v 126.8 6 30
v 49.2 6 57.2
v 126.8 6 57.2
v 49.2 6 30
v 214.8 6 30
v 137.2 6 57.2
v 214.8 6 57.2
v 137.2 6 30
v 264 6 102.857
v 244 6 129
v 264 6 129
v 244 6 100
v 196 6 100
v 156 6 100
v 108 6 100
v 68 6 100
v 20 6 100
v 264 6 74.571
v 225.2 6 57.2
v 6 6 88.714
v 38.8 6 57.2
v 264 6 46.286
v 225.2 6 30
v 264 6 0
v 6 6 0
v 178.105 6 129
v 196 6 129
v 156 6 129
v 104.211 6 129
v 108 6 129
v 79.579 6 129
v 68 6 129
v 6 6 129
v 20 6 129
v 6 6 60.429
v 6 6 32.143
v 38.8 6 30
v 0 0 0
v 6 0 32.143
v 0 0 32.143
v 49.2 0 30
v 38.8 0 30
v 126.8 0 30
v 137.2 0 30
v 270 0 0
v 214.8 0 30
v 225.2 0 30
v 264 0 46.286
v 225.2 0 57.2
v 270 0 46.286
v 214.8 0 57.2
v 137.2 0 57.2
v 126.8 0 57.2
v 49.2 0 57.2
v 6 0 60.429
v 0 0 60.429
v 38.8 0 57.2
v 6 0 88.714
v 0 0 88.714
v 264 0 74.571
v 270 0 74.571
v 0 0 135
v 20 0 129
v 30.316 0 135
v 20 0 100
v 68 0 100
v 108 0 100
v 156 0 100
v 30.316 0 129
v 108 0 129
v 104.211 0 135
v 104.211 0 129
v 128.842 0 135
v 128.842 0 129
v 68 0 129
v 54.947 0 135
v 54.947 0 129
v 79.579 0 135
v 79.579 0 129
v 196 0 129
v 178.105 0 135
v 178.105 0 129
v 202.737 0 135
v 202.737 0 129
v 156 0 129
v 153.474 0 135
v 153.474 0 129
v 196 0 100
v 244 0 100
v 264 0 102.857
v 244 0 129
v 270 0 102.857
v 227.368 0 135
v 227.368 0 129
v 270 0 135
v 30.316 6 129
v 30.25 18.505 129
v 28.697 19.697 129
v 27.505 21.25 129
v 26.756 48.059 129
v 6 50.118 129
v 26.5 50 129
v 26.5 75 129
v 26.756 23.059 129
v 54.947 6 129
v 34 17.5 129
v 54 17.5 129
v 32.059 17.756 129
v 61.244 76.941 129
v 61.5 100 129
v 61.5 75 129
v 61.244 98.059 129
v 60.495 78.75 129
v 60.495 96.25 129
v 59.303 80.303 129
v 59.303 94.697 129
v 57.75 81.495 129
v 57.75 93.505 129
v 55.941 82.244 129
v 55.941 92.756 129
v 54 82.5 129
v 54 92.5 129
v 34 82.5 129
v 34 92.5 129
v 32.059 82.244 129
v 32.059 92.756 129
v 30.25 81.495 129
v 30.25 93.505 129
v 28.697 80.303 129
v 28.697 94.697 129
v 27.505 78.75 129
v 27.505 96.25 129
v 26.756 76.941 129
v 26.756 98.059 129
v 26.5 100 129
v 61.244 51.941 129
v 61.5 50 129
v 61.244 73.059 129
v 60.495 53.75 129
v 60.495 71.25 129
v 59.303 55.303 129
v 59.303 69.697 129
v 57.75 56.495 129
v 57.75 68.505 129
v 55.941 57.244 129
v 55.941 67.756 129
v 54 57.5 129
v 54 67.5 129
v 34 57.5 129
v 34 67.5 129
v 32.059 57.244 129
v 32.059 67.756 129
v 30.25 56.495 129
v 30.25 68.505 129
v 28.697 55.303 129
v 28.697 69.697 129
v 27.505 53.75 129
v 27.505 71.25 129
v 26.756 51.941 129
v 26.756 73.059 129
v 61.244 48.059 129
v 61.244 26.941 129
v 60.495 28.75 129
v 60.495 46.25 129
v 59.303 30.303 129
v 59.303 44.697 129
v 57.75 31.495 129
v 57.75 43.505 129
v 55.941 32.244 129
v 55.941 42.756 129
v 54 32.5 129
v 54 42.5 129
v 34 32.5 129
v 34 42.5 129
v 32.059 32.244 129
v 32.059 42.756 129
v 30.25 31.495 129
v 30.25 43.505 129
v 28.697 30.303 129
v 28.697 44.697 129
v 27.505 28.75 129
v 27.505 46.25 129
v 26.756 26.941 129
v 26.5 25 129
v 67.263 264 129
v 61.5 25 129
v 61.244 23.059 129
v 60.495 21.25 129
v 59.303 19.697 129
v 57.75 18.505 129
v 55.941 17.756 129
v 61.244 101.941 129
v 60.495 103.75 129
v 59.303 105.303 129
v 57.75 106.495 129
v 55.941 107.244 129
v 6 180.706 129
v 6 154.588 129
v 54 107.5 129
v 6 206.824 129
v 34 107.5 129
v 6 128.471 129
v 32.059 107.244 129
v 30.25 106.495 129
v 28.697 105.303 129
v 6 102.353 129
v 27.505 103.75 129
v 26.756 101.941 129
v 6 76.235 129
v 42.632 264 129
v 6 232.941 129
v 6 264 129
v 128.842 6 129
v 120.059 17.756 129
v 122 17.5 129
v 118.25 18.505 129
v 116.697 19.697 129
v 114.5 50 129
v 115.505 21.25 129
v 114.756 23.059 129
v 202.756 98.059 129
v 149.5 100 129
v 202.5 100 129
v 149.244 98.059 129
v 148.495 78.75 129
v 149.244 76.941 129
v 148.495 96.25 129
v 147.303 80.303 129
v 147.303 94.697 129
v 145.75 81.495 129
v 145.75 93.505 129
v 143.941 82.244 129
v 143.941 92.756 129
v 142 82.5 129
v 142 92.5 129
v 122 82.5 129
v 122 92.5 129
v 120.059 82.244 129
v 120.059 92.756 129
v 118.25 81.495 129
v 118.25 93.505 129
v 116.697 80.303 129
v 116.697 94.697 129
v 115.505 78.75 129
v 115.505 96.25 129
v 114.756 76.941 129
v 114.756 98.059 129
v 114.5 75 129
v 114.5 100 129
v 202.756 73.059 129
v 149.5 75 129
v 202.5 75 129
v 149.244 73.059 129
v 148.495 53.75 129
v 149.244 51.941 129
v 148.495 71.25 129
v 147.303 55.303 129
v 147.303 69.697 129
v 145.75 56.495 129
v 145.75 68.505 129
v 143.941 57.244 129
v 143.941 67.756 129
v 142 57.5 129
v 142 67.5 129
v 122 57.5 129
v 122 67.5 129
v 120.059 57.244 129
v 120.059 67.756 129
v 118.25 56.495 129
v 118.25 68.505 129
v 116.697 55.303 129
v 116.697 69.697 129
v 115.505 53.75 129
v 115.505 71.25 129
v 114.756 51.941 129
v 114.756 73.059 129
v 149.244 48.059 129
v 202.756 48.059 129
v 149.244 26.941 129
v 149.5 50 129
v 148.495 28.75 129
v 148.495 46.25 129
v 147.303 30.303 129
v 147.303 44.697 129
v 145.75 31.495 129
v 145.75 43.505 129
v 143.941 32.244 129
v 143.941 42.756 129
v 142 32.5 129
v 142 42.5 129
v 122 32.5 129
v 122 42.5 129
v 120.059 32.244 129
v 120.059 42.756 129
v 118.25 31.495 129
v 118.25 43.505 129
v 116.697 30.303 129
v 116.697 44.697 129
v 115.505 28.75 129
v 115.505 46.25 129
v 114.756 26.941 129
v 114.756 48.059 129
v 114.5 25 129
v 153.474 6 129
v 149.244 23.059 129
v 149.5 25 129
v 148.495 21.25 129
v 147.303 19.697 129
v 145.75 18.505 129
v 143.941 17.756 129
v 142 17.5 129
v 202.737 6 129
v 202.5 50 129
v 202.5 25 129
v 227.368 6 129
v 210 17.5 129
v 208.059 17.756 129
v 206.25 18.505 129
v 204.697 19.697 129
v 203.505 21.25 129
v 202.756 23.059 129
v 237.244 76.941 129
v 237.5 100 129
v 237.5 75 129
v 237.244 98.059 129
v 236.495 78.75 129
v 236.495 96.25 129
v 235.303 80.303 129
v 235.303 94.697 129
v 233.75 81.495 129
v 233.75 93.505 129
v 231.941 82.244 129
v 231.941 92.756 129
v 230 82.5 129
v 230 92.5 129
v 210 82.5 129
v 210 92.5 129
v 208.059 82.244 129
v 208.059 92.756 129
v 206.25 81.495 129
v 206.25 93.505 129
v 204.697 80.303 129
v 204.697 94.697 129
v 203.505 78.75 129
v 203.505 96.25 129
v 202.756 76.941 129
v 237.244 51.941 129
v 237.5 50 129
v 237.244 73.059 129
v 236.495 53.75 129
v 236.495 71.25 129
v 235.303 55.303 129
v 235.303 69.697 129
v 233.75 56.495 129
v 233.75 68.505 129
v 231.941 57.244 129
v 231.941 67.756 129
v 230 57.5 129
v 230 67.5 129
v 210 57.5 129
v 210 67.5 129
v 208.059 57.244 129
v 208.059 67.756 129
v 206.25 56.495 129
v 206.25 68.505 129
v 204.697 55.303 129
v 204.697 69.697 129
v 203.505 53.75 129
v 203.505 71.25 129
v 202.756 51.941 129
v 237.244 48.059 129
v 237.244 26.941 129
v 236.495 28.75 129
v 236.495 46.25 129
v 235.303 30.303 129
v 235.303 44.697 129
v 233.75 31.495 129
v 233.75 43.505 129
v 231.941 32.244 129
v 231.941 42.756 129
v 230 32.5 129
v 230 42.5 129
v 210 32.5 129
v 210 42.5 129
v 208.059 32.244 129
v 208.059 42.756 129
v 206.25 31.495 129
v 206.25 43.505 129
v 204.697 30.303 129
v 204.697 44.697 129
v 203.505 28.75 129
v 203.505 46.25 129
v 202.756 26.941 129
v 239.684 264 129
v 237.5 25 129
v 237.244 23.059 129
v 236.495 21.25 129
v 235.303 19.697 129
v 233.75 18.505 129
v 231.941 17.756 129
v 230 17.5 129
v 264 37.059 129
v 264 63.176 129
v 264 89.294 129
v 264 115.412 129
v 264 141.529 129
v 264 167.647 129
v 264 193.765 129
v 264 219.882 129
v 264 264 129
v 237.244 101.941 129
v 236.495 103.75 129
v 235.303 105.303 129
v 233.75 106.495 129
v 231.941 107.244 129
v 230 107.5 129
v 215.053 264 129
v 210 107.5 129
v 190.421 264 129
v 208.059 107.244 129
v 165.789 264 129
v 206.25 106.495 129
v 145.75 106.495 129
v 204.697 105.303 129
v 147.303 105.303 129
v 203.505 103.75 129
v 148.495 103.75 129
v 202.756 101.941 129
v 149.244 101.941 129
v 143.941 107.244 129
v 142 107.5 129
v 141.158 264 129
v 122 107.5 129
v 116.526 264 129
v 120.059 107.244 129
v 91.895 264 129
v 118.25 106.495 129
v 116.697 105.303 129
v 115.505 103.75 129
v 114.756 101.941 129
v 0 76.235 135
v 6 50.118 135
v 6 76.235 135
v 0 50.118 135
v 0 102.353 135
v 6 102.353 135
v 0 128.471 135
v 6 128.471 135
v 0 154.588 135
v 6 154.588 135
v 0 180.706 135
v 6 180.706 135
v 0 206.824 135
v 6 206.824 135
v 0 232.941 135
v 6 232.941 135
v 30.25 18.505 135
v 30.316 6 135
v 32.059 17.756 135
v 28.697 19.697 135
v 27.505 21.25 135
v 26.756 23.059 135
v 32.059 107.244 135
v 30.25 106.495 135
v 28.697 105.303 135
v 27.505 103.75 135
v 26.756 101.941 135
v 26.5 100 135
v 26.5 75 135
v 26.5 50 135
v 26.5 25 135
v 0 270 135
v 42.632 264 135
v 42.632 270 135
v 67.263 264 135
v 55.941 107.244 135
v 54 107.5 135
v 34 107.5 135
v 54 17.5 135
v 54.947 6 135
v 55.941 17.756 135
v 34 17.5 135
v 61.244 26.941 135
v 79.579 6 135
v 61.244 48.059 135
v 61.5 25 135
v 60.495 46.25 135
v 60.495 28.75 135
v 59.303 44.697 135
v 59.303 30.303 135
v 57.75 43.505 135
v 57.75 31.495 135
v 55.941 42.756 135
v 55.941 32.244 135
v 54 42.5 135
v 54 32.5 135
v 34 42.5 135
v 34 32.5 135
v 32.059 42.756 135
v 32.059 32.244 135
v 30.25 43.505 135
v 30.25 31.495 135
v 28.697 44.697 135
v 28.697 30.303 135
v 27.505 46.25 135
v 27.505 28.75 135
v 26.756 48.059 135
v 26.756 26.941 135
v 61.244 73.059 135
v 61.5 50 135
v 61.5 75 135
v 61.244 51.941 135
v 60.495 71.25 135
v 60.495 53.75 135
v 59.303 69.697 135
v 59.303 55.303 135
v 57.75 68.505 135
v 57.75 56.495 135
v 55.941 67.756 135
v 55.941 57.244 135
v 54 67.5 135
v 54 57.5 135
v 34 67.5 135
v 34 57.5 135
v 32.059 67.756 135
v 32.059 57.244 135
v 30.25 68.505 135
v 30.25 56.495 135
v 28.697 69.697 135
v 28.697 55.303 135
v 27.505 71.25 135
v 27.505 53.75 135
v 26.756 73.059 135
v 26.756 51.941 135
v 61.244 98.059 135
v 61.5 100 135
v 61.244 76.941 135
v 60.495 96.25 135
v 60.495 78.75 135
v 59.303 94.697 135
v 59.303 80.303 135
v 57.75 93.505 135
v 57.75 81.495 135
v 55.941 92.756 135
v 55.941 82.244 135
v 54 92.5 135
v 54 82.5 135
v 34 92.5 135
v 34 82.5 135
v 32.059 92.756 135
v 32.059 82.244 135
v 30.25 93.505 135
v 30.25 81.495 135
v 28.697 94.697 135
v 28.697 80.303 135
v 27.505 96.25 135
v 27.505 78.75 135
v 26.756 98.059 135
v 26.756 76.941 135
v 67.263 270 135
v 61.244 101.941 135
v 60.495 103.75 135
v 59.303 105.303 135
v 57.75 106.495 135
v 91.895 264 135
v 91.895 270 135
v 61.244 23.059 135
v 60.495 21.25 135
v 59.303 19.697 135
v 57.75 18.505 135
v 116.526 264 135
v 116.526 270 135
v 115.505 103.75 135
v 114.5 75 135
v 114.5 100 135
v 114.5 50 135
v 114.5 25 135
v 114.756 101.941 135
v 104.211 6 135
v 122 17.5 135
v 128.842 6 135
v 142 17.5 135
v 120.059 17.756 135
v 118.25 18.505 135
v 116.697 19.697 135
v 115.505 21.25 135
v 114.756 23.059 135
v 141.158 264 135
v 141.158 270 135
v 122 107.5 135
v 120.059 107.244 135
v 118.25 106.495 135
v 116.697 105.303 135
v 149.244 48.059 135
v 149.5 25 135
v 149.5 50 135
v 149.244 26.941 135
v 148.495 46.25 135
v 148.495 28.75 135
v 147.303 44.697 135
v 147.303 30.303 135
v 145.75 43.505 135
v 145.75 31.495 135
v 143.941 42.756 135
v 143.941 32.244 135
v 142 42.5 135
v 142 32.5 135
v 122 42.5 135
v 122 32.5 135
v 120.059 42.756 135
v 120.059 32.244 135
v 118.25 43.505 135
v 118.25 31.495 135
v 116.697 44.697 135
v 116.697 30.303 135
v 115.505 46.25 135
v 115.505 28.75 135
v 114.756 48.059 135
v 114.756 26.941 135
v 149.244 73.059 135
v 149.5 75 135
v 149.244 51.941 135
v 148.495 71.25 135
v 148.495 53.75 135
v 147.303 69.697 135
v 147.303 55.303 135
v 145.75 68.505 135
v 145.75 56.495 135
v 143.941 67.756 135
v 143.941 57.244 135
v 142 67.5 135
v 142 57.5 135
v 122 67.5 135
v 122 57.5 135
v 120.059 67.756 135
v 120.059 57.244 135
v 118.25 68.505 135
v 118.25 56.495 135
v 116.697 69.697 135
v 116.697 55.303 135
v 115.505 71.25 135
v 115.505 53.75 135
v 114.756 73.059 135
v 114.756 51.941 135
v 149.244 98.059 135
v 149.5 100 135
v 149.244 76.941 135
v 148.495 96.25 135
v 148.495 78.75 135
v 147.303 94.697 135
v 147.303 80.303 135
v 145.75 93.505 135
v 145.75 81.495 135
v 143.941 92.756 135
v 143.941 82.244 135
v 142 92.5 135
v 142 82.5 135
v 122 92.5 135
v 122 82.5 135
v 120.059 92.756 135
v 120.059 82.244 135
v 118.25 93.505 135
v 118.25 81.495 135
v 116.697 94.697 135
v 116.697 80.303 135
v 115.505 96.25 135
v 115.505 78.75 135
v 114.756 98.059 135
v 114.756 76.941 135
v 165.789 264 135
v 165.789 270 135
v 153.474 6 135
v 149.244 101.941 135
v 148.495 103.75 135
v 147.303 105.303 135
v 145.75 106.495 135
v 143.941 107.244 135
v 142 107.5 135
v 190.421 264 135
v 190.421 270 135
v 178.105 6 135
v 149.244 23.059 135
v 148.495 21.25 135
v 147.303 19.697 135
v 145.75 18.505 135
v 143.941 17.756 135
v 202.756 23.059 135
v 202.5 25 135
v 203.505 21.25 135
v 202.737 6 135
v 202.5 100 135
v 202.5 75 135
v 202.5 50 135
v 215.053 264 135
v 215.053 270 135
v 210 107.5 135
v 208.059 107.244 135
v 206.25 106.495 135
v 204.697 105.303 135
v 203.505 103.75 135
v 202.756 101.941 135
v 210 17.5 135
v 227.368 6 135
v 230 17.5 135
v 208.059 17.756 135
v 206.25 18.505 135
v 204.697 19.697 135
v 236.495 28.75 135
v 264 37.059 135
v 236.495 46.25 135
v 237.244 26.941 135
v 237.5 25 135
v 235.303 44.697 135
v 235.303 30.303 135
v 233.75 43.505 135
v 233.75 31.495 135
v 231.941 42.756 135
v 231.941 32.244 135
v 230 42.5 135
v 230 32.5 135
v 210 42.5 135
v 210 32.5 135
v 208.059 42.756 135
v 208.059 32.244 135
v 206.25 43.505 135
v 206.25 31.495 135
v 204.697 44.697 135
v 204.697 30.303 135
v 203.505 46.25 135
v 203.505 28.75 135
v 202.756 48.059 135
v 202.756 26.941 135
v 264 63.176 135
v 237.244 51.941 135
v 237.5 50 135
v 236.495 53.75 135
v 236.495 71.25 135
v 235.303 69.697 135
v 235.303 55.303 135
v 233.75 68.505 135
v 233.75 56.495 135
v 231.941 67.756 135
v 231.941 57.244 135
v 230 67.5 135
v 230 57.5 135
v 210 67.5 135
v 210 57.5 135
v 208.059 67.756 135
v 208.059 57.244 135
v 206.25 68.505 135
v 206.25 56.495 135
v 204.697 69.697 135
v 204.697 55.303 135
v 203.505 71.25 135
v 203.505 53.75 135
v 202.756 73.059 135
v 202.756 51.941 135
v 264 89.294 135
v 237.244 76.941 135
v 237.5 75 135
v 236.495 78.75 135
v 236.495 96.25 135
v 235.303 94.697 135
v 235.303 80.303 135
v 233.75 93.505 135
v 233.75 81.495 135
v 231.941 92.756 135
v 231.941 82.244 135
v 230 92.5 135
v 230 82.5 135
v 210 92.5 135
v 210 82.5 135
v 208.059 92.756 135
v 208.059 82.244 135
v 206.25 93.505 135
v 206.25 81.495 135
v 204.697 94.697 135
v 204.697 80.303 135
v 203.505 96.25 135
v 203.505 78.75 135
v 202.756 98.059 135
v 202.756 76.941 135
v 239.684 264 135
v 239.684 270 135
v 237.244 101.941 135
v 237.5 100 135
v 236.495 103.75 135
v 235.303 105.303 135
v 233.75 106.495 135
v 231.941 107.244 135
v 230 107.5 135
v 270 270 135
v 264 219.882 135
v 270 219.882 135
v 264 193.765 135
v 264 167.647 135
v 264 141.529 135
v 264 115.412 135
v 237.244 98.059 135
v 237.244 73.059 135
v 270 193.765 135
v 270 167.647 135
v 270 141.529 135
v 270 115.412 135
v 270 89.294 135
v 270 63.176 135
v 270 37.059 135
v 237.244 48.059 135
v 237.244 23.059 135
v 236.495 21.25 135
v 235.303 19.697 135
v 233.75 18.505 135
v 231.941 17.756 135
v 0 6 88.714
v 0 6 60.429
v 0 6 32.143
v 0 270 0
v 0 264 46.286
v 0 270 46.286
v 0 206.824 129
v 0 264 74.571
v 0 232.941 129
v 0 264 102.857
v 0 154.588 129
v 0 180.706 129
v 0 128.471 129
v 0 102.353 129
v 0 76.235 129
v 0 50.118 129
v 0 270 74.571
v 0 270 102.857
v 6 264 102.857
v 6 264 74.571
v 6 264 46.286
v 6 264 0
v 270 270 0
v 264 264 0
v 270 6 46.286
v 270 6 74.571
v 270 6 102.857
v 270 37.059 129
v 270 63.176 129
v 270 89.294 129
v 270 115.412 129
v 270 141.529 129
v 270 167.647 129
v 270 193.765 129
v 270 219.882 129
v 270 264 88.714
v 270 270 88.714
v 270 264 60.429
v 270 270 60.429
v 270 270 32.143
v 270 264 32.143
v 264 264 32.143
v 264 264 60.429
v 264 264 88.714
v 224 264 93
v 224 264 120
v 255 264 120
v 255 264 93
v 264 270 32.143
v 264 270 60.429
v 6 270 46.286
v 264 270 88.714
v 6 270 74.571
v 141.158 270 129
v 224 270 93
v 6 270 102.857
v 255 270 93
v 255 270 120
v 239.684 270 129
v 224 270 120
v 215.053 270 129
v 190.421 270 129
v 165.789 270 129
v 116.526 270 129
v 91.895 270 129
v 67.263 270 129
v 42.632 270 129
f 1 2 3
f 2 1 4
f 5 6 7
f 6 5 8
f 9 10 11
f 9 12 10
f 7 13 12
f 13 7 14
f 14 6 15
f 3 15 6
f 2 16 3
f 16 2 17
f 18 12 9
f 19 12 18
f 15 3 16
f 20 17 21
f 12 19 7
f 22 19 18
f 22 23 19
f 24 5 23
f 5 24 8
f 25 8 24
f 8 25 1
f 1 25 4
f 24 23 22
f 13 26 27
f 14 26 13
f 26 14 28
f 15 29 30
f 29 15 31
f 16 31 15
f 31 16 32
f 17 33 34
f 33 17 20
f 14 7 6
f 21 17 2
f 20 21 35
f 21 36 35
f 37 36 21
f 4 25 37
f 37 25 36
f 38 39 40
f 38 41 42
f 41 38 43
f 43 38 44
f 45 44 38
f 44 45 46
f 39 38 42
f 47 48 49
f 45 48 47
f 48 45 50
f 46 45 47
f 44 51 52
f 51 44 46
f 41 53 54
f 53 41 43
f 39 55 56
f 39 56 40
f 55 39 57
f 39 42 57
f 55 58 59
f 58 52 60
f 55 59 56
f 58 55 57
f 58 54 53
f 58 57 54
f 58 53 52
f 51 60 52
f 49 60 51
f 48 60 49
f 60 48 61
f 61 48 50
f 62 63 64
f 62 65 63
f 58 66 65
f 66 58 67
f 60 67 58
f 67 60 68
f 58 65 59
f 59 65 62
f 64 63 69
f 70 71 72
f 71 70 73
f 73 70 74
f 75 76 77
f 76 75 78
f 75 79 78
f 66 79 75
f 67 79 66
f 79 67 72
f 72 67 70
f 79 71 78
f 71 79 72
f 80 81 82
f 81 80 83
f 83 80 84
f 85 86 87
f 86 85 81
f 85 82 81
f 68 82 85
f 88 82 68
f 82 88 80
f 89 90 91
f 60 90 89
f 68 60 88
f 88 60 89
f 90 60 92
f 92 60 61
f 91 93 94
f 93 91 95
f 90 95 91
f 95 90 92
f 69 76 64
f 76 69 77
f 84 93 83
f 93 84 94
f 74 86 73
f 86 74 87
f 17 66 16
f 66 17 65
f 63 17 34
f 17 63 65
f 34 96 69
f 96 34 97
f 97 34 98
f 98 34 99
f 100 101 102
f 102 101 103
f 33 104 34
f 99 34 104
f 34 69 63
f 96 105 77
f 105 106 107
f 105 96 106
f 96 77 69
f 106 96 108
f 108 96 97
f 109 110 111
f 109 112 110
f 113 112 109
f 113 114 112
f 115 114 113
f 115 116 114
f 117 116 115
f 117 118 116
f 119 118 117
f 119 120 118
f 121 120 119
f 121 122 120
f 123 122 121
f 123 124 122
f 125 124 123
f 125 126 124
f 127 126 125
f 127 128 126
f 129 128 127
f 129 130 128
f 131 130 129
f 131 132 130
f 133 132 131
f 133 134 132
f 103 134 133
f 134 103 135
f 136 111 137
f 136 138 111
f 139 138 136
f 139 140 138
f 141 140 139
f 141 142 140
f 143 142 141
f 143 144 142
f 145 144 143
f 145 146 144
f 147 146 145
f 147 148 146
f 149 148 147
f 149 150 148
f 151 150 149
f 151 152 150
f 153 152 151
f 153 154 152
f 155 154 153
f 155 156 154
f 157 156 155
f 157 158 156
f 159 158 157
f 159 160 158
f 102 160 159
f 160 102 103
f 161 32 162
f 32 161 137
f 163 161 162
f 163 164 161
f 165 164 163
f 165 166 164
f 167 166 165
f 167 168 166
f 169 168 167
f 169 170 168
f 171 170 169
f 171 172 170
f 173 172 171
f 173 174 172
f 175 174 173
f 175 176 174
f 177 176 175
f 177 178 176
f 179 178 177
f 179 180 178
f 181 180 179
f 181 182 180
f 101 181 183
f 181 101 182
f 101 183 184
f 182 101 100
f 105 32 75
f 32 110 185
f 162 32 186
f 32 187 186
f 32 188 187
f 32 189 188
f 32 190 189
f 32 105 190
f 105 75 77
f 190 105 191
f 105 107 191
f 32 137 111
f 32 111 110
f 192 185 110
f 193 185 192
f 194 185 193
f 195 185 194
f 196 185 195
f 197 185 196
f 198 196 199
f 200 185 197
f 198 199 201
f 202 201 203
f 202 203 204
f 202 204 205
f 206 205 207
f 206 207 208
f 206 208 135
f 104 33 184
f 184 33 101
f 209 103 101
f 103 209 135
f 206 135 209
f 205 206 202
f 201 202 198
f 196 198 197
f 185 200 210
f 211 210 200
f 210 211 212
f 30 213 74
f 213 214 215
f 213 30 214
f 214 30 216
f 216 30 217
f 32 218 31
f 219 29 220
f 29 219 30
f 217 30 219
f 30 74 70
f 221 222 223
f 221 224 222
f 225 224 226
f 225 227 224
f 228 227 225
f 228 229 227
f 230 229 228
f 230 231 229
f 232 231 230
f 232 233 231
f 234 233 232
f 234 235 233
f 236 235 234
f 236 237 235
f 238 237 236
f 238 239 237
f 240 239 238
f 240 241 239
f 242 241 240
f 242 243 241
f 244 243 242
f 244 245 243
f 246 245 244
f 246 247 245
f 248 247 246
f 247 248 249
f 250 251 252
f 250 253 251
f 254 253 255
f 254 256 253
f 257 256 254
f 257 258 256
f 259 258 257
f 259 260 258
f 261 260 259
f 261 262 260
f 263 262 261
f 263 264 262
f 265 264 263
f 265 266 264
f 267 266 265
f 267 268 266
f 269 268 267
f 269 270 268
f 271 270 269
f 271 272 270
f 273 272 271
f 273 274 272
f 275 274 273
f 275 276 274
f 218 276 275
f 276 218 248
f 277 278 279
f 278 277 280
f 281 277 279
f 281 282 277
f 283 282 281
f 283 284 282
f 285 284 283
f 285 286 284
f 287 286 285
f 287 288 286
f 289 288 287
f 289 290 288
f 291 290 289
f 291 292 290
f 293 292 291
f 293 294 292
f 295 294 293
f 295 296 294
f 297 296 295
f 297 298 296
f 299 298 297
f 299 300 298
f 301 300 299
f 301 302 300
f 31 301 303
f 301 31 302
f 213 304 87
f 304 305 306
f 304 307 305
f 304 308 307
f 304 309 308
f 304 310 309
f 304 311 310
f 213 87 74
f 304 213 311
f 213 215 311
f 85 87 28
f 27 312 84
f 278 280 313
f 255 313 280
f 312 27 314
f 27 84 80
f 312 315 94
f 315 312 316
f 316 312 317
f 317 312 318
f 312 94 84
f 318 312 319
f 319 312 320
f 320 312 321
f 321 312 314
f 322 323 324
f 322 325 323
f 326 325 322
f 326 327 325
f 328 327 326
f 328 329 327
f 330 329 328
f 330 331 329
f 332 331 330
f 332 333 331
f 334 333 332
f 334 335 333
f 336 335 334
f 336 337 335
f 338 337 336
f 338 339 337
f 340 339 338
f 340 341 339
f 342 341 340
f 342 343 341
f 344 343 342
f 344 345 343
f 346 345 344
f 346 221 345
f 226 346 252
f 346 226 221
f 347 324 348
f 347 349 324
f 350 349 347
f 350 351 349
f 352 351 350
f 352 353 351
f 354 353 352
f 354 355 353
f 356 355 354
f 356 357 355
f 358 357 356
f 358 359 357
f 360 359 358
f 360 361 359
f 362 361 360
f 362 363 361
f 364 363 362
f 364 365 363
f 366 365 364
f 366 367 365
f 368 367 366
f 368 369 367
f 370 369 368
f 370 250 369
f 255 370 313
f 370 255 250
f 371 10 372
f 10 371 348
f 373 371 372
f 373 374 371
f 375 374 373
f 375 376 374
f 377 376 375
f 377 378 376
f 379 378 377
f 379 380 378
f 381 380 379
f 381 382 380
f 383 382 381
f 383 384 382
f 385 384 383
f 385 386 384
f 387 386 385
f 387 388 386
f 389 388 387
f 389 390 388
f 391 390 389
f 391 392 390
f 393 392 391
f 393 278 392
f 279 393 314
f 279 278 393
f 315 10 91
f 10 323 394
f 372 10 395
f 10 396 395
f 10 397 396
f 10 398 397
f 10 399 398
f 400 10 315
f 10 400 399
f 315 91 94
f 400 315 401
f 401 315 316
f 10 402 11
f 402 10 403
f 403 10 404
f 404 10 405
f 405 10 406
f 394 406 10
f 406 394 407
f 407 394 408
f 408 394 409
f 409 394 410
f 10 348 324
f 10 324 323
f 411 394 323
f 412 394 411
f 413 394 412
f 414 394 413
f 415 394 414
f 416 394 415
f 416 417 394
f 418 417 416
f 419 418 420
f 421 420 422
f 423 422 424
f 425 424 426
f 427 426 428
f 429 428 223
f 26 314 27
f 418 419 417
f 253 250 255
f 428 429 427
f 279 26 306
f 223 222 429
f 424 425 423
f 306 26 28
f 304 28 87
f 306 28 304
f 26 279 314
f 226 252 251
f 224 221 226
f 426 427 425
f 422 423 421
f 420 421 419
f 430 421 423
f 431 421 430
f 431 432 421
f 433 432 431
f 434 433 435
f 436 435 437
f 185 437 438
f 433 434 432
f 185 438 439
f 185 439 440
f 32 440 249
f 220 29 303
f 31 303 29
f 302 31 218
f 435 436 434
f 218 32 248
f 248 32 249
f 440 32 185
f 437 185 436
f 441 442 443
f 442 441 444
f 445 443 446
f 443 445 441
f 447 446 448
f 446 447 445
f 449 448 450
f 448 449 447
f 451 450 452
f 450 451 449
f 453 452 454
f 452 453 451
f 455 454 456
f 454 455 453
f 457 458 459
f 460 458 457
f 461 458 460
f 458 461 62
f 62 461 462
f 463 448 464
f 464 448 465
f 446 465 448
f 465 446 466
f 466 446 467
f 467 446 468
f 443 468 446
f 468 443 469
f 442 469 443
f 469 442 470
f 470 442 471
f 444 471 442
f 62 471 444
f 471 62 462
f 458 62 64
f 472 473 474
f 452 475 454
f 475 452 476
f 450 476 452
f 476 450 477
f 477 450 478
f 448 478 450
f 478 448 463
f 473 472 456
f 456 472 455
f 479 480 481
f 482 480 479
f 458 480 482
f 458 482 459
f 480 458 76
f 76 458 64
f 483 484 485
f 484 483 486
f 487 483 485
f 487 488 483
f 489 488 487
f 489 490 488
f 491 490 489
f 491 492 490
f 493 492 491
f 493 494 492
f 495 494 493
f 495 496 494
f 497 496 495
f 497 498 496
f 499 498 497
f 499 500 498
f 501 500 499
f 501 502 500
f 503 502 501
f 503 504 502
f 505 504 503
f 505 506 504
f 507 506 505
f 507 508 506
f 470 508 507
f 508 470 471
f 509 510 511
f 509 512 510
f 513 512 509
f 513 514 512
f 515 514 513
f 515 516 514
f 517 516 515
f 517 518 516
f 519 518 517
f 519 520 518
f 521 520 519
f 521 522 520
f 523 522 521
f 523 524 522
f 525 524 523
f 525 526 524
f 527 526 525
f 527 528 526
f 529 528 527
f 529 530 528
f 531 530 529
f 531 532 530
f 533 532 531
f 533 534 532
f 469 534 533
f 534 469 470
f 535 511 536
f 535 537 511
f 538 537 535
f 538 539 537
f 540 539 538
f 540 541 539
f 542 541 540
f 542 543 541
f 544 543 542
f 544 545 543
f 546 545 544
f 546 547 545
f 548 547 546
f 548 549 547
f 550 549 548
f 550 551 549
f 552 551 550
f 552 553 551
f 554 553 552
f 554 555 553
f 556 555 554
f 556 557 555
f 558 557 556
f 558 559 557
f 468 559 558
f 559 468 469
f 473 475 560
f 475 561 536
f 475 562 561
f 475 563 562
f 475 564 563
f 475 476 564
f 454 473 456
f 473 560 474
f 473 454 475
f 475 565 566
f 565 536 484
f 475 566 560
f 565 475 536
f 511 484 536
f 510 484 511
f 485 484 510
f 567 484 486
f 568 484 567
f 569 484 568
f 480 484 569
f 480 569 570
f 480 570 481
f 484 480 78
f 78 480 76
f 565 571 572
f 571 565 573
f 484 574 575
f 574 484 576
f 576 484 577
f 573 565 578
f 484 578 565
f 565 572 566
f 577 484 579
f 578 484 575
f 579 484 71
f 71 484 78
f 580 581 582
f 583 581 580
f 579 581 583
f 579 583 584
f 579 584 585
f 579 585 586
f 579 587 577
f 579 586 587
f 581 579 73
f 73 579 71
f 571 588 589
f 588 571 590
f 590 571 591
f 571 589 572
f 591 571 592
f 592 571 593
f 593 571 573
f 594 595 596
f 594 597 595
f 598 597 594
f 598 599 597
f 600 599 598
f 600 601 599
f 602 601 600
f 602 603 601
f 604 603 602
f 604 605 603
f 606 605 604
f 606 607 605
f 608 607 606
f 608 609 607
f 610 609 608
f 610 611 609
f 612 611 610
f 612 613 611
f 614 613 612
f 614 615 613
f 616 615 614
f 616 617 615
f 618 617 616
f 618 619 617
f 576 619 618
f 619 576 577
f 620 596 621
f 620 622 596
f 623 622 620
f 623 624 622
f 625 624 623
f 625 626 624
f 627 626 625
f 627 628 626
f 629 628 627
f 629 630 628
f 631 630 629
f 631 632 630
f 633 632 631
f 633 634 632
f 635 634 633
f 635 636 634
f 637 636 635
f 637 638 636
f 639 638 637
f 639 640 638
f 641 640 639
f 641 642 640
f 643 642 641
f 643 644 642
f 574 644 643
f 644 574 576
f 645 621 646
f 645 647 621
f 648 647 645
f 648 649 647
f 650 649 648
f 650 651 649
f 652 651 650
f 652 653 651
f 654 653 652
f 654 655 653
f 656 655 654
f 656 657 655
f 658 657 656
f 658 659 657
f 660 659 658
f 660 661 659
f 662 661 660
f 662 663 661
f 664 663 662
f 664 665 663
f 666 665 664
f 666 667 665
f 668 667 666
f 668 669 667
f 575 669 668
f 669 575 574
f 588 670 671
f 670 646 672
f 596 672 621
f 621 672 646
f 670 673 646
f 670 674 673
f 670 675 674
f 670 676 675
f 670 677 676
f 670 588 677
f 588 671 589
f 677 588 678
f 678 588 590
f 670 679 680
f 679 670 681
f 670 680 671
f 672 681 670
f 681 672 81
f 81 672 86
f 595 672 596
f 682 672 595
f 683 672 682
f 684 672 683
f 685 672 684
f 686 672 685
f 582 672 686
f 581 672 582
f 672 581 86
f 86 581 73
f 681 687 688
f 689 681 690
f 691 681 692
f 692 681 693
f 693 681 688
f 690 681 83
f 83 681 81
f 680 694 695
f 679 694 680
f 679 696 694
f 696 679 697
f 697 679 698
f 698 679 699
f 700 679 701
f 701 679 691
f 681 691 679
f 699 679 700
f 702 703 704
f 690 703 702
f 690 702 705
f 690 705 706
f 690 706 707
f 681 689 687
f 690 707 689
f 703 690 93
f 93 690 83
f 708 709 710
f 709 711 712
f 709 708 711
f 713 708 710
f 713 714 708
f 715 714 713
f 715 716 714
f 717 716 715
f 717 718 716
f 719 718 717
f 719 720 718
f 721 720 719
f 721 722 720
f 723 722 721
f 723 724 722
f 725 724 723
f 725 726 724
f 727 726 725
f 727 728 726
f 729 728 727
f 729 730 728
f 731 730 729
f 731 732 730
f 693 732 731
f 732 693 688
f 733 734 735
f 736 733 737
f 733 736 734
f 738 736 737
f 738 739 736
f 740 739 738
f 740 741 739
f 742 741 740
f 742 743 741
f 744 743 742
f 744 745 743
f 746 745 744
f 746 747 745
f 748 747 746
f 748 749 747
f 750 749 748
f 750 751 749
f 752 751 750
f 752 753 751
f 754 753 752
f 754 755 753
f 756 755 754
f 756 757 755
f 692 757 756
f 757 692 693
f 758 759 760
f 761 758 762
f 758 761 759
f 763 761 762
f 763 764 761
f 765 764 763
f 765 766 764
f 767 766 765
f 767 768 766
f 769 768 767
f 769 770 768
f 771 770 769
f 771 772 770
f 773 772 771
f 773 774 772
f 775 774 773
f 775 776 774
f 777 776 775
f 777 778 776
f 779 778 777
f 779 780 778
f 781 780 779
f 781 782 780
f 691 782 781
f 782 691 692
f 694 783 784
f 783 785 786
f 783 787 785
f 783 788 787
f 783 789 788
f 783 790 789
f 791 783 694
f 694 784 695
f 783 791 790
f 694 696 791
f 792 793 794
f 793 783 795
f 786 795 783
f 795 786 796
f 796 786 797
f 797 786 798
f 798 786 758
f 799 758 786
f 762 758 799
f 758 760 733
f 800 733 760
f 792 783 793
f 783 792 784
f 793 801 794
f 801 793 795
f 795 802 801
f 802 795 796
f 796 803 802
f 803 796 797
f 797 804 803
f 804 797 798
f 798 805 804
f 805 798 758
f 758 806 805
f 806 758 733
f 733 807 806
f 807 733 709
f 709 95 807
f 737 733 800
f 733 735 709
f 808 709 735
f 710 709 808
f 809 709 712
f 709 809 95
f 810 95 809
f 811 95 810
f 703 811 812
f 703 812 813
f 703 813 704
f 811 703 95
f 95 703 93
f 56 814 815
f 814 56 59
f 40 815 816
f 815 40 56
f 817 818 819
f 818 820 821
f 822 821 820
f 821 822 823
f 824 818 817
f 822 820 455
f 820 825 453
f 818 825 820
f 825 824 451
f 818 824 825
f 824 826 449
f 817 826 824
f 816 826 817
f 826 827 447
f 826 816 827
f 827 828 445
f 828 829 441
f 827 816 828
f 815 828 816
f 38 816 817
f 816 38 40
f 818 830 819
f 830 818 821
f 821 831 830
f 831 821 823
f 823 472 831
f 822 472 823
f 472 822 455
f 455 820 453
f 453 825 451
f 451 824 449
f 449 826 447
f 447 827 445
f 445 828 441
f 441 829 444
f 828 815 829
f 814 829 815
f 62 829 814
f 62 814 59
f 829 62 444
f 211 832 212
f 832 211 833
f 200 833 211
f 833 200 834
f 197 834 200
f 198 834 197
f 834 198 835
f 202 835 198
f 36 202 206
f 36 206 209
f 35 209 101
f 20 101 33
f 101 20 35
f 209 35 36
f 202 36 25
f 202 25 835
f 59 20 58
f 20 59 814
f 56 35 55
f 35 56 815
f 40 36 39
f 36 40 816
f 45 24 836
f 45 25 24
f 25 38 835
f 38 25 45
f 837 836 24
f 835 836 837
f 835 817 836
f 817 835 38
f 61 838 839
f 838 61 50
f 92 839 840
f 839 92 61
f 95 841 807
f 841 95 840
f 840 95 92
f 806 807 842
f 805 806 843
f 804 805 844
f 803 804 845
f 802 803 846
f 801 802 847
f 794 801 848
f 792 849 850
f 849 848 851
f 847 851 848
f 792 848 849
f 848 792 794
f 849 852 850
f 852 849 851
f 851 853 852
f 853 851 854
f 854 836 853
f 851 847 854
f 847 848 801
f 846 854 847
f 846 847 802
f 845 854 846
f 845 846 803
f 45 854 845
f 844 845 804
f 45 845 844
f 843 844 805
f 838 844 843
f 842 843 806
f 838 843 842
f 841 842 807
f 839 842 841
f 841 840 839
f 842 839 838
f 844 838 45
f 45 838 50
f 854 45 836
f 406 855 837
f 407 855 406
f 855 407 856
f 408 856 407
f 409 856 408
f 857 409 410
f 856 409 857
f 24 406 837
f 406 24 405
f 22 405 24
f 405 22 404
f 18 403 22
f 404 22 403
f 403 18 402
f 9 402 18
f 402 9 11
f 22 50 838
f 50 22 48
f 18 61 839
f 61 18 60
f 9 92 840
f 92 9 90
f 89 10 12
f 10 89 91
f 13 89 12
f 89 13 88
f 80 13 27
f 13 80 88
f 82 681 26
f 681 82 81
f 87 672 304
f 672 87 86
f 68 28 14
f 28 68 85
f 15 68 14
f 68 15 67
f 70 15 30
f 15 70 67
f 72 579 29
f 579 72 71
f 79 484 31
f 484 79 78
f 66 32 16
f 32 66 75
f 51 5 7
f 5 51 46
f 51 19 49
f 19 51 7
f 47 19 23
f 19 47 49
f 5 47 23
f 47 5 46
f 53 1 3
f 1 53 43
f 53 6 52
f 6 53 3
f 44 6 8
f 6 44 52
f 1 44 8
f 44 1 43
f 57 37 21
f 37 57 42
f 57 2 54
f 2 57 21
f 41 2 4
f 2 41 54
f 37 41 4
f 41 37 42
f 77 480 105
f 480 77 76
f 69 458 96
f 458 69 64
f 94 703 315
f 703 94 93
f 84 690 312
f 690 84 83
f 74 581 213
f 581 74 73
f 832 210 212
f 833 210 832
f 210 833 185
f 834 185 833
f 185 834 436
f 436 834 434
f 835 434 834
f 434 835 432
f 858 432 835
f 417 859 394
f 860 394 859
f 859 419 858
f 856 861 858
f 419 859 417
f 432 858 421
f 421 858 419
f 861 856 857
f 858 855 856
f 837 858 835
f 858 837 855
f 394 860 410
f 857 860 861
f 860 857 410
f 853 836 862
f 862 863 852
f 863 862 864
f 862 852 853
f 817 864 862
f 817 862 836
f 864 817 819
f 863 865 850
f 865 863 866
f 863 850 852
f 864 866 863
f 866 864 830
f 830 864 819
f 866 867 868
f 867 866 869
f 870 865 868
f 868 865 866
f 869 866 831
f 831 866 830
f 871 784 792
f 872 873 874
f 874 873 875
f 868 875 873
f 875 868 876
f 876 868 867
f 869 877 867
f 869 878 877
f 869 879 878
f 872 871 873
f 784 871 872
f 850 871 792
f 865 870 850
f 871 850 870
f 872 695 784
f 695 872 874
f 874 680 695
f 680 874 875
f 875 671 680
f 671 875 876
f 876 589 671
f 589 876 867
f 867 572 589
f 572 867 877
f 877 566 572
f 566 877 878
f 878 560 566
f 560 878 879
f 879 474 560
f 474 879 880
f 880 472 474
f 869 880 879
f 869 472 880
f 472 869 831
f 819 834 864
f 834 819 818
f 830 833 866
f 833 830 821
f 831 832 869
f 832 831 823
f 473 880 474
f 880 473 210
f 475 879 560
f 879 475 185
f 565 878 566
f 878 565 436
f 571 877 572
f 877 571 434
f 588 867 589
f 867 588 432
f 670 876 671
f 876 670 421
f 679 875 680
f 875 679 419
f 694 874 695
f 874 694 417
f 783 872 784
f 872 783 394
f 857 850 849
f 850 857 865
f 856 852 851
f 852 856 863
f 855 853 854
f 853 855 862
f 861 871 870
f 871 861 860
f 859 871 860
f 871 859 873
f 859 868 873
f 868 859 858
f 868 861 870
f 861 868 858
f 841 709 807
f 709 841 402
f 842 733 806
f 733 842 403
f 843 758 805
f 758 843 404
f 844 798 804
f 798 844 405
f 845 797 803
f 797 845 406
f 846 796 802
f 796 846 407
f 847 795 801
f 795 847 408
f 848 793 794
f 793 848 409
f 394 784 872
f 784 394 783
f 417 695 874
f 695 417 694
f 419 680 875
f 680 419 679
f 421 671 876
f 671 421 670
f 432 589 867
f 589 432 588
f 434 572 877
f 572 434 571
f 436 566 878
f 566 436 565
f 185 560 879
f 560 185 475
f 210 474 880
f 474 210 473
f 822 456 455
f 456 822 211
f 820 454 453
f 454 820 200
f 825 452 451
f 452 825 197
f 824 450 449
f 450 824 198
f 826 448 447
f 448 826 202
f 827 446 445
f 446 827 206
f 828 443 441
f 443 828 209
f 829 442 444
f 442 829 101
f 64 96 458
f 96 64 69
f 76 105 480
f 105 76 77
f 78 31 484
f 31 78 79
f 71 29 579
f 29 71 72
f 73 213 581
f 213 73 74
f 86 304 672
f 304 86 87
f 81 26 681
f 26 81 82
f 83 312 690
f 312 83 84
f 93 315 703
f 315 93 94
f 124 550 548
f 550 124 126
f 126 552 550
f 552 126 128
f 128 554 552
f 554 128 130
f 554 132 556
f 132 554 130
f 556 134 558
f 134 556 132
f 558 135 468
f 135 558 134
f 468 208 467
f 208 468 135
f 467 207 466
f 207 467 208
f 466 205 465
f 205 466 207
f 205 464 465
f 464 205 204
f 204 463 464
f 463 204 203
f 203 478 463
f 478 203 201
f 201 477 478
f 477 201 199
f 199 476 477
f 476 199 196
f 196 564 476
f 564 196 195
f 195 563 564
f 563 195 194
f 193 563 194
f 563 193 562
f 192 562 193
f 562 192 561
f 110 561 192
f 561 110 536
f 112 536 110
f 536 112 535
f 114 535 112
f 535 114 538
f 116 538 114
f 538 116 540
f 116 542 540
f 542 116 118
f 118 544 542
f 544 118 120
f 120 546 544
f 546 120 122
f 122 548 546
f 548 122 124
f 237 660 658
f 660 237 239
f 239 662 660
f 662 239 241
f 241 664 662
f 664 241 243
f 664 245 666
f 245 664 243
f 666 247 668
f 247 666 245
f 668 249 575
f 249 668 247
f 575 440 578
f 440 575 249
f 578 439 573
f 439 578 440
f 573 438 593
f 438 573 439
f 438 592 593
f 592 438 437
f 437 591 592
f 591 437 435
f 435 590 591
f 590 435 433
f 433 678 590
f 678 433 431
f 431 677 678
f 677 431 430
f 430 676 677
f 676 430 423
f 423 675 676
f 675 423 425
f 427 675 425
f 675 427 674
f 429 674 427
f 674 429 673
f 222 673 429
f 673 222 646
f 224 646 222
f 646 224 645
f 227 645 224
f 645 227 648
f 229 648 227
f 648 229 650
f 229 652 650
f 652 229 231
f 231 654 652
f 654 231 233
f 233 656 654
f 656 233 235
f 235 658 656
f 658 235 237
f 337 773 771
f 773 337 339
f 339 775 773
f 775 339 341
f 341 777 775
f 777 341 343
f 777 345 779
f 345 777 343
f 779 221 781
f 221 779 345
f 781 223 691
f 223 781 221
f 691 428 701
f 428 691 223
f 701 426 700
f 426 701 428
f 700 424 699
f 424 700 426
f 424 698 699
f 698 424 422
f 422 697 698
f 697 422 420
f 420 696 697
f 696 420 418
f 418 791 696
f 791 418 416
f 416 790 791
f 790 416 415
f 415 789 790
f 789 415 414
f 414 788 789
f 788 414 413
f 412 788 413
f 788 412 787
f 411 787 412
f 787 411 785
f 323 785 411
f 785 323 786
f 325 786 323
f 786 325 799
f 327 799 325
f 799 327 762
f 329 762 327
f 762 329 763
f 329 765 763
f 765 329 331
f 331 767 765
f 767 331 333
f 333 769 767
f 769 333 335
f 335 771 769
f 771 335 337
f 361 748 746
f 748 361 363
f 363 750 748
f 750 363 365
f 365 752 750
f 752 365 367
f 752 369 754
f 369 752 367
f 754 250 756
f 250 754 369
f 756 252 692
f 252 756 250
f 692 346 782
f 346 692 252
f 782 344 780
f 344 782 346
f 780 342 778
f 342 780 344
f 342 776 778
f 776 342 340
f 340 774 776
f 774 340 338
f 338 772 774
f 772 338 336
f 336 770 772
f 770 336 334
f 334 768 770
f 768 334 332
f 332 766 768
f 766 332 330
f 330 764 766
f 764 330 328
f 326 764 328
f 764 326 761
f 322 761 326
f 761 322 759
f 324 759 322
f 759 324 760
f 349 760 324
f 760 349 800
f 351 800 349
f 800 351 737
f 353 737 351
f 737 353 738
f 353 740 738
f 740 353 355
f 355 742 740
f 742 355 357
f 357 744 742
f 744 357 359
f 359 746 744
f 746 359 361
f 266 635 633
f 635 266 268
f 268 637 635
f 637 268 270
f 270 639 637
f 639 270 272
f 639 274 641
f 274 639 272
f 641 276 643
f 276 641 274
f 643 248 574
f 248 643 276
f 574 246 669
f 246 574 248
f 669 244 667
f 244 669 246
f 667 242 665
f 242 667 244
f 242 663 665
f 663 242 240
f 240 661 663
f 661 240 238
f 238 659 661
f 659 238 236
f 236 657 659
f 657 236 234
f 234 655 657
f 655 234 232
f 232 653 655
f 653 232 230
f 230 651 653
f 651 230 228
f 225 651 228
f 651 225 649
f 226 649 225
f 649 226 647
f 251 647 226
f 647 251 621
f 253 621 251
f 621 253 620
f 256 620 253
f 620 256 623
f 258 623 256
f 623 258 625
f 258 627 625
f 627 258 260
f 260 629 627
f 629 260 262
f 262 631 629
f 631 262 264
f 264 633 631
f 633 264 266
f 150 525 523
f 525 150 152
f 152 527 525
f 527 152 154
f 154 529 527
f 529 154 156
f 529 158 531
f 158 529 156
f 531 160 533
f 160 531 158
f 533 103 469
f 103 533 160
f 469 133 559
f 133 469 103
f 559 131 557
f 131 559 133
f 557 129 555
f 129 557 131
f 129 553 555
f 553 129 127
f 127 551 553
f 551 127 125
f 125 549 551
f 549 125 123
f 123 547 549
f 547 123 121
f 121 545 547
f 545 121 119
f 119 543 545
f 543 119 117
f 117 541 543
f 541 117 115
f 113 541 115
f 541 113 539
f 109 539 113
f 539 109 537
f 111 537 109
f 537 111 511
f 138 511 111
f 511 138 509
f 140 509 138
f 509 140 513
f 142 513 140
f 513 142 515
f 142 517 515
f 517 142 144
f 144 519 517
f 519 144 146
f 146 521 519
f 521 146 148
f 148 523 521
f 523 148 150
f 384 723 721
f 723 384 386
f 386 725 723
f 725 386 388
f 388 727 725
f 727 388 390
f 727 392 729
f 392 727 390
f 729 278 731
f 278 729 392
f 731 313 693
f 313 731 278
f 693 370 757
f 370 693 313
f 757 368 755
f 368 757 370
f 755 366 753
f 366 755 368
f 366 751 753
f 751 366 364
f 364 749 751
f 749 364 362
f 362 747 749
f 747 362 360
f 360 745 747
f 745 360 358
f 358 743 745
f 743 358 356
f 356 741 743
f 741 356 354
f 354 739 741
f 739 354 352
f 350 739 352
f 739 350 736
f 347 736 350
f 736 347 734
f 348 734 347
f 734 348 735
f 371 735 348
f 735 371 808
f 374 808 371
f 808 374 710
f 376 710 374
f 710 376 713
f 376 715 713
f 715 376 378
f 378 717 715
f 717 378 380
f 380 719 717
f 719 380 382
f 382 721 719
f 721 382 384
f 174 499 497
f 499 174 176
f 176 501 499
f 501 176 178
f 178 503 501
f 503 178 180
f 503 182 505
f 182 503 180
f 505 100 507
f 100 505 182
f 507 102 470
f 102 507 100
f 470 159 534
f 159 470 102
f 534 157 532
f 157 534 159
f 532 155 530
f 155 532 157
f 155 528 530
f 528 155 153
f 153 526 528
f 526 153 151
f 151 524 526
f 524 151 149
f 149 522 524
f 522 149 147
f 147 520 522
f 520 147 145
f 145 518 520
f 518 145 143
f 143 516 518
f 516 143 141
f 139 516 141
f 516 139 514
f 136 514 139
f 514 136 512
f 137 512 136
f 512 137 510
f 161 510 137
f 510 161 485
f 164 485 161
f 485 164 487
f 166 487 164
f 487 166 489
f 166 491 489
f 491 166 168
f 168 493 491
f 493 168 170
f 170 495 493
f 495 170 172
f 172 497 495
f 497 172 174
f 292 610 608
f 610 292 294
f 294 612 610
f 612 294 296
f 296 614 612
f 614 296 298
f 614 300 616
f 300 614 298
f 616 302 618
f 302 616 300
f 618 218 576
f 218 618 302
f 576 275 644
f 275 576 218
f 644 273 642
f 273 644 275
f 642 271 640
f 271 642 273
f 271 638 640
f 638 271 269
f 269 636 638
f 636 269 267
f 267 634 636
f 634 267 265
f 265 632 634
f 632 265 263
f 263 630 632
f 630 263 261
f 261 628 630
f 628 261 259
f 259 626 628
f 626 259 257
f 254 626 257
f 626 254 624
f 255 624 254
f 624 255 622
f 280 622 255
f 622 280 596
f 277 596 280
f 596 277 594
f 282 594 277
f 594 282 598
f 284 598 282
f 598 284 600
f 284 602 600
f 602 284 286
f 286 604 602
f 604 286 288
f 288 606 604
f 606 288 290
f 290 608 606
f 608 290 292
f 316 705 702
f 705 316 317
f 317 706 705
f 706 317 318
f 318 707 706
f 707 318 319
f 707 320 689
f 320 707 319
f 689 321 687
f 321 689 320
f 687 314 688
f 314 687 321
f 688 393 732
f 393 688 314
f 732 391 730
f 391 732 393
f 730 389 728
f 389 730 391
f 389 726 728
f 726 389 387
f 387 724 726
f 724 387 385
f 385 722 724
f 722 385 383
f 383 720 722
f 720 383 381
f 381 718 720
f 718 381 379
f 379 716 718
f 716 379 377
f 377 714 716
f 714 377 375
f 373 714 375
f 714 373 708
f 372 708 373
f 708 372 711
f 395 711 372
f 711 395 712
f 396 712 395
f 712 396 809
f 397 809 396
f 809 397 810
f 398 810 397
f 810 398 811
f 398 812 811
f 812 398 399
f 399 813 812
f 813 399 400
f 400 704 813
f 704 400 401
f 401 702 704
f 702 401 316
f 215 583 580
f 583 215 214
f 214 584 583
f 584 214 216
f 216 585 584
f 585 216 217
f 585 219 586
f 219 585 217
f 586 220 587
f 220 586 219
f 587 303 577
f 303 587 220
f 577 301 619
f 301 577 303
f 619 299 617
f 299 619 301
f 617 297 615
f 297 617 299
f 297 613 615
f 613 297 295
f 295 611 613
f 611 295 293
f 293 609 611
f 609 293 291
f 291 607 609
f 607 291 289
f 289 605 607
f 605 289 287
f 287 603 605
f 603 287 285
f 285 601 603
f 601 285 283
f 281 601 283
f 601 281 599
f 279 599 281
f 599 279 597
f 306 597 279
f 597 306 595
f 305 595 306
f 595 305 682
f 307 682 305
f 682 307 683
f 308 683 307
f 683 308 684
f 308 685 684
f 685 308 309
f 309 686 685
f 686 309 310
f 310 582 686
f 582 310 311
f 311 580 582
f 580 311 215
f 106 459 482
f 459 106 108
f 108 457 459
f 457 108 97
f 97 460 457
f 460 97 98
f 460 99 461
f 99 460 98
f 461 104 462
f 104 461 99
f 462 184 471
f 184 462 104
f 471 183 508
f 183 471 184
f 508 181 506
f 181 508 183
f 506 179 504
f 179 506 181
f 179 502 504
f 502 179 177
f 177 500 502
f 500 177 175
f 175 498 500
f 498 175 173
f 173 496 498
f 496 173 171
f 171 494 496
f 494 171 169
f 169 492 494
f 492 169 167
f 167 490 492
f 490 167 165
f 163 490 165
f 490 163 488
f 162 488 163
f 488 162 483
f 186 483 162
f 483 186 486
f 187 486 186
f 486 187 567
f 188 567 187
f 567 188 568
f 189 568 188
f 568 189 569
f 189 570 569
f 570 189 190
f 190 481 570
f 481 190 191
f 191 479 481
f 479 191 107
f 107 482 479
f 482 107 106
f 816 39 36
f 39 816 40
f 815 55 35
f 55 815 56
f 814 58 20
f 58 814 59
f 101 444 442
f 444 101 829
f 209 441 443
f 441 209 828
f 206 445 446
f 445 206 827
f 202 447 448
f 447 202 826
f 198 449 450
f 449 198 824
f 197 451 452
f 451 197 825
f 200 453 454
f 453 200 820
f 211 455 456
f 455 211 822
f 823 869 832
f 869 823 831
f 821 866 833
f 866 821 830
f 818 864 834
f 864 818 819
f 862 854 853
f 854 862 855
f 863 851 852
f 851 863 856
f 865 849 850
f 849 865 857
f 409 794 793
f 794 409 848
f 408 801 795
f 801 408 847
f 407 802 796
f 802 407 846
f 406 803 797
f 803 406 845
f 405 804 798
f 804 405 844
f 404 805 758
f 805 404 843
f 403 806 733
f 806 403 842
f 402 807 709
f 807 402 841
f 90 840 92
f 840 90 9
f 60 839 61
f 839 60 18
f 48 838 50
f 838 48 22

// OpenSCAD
// file: psu-dimensions.scad
total_width = 270;
total_depth = 270;
total_height = 135;

outer_thickness = 3;
inner_thickness = 6;

margin = 15;
cutting_space = 5;

sections = 3;

section_width = (total_width - 2 * outer_thickness) / 3;

half_section_width = section_width / 2;

inner_depth = total_depth - outer_thickness;

switch_height = 27.2;
switch_width = 10.4;

meter_width = 48;
meter_height = 29;

meter_switch_gap = 12;

meter_and_switch_height = max(meter_height, switch_height);
meter_and_switch_width = meter_width + meter_switch_gap + switch_width;

mains_inlet_width = 31;
mains_inlet_height = 27;

switch_offset = 30;
meter_offset = 100;

adjuster_width = 79;
adjuster_height = 42;
adjuster_depth = 42;
adjuster_y_offset = 25;

binding_post_hole_inner_diameter = 15;
binding_post_hole_outer_diameter = 3;
binding_post_rows = 4;
binding_post_spacing = 20;
binding_post_row_spacing = 25;
binding_post_offset = binding_post_row_spacing;

ventilation_panel_start = mains_inlet_width + margin * 3;
ventilation_hole_diameter = 10;
ventilation_hole_spacing = ventilation_hole_diameter * 1.5;
rear_ventilation_holes_per_row = (total_width - (ventilation_panel_start + margin * 2)) / ventilation_hole_spacing;
rear_ventilation_hole_rows = (total_height  - (margin * 2)) / ventilation_hole_spacing;
side_ventilation_area_length = total_depth/3;
side_ventilation_holes_per_row = side_ventilation_area_length / ventilation_hole_spacing;
side_ventilation_hole_rows = (total_height  - (margin * 2)) / ventilation_hole_spacing;

module binding_post_hole_pair(diameter, spacing, join) {
     translate([-spacing/2, 0]) circle(d=diameter);
     translate([spacing/2, 0]) circle(d=diameter);
     if (join) {
         translate([-spacing/2, -diameter/2]) square([spacing, diameter]);
     }
}

module meter_and_switch() {
    translate([-meter_and_switch_width/2, -meter_and_switch_height/2]) {
        square([switch_width, switch_height]);
        translate([switch_width + meter_switch_gap, (switch_height - meter_height)/2]) {
            square([meter_width, meter_height]);
        }
    }
}
// main file
include <psu-box.scad>
include <psu-dimensions.scad>

module one_front_inner_cutout() {
     translate([half_section_width - switch_width/2, switch_offset]) square([switch_width, switch_height]);
     translate([half_section_width - meter_width/2, meter_offset]) square([meter_width, meter_height]);
}

module one_top_inner_cutout() {
     for (i=[1:binding_post_rows]) {
          translate([half_section_width, i * binding_post_row_spacing]) binding_post_hole_pair(binding_post_hole_inner_diameter, binding_post_spacing, true);
     }
}

module front_inner_cutouts() {
     for (i=[0:sections]) {
          translate([i * section_width, 0]) {
               one_front_inner_cutout();
          }
     }
}

module back_inner_cutouts() {
     translate([margin, total_height - (margin + mains_inlet_height)]) square([mains_inlet_width, mains_inlet_height]);
}

module top_inner_cutouts() {
     for (i=[0:sections]) {
          translate([i * section_width, 0]) {
               one_top_inner_cutout();
          }
     }
}

module psu_case_inner() {
     box(total_width, total_height, total_depth, inner_thickness,
         assemble=true,
         labels=true,
         open_bottom=true) {
          front_inner_cutouts();
          top_inner_cutouts();
          back_inner_cutouts();
     };
}

psu_case_inner();
